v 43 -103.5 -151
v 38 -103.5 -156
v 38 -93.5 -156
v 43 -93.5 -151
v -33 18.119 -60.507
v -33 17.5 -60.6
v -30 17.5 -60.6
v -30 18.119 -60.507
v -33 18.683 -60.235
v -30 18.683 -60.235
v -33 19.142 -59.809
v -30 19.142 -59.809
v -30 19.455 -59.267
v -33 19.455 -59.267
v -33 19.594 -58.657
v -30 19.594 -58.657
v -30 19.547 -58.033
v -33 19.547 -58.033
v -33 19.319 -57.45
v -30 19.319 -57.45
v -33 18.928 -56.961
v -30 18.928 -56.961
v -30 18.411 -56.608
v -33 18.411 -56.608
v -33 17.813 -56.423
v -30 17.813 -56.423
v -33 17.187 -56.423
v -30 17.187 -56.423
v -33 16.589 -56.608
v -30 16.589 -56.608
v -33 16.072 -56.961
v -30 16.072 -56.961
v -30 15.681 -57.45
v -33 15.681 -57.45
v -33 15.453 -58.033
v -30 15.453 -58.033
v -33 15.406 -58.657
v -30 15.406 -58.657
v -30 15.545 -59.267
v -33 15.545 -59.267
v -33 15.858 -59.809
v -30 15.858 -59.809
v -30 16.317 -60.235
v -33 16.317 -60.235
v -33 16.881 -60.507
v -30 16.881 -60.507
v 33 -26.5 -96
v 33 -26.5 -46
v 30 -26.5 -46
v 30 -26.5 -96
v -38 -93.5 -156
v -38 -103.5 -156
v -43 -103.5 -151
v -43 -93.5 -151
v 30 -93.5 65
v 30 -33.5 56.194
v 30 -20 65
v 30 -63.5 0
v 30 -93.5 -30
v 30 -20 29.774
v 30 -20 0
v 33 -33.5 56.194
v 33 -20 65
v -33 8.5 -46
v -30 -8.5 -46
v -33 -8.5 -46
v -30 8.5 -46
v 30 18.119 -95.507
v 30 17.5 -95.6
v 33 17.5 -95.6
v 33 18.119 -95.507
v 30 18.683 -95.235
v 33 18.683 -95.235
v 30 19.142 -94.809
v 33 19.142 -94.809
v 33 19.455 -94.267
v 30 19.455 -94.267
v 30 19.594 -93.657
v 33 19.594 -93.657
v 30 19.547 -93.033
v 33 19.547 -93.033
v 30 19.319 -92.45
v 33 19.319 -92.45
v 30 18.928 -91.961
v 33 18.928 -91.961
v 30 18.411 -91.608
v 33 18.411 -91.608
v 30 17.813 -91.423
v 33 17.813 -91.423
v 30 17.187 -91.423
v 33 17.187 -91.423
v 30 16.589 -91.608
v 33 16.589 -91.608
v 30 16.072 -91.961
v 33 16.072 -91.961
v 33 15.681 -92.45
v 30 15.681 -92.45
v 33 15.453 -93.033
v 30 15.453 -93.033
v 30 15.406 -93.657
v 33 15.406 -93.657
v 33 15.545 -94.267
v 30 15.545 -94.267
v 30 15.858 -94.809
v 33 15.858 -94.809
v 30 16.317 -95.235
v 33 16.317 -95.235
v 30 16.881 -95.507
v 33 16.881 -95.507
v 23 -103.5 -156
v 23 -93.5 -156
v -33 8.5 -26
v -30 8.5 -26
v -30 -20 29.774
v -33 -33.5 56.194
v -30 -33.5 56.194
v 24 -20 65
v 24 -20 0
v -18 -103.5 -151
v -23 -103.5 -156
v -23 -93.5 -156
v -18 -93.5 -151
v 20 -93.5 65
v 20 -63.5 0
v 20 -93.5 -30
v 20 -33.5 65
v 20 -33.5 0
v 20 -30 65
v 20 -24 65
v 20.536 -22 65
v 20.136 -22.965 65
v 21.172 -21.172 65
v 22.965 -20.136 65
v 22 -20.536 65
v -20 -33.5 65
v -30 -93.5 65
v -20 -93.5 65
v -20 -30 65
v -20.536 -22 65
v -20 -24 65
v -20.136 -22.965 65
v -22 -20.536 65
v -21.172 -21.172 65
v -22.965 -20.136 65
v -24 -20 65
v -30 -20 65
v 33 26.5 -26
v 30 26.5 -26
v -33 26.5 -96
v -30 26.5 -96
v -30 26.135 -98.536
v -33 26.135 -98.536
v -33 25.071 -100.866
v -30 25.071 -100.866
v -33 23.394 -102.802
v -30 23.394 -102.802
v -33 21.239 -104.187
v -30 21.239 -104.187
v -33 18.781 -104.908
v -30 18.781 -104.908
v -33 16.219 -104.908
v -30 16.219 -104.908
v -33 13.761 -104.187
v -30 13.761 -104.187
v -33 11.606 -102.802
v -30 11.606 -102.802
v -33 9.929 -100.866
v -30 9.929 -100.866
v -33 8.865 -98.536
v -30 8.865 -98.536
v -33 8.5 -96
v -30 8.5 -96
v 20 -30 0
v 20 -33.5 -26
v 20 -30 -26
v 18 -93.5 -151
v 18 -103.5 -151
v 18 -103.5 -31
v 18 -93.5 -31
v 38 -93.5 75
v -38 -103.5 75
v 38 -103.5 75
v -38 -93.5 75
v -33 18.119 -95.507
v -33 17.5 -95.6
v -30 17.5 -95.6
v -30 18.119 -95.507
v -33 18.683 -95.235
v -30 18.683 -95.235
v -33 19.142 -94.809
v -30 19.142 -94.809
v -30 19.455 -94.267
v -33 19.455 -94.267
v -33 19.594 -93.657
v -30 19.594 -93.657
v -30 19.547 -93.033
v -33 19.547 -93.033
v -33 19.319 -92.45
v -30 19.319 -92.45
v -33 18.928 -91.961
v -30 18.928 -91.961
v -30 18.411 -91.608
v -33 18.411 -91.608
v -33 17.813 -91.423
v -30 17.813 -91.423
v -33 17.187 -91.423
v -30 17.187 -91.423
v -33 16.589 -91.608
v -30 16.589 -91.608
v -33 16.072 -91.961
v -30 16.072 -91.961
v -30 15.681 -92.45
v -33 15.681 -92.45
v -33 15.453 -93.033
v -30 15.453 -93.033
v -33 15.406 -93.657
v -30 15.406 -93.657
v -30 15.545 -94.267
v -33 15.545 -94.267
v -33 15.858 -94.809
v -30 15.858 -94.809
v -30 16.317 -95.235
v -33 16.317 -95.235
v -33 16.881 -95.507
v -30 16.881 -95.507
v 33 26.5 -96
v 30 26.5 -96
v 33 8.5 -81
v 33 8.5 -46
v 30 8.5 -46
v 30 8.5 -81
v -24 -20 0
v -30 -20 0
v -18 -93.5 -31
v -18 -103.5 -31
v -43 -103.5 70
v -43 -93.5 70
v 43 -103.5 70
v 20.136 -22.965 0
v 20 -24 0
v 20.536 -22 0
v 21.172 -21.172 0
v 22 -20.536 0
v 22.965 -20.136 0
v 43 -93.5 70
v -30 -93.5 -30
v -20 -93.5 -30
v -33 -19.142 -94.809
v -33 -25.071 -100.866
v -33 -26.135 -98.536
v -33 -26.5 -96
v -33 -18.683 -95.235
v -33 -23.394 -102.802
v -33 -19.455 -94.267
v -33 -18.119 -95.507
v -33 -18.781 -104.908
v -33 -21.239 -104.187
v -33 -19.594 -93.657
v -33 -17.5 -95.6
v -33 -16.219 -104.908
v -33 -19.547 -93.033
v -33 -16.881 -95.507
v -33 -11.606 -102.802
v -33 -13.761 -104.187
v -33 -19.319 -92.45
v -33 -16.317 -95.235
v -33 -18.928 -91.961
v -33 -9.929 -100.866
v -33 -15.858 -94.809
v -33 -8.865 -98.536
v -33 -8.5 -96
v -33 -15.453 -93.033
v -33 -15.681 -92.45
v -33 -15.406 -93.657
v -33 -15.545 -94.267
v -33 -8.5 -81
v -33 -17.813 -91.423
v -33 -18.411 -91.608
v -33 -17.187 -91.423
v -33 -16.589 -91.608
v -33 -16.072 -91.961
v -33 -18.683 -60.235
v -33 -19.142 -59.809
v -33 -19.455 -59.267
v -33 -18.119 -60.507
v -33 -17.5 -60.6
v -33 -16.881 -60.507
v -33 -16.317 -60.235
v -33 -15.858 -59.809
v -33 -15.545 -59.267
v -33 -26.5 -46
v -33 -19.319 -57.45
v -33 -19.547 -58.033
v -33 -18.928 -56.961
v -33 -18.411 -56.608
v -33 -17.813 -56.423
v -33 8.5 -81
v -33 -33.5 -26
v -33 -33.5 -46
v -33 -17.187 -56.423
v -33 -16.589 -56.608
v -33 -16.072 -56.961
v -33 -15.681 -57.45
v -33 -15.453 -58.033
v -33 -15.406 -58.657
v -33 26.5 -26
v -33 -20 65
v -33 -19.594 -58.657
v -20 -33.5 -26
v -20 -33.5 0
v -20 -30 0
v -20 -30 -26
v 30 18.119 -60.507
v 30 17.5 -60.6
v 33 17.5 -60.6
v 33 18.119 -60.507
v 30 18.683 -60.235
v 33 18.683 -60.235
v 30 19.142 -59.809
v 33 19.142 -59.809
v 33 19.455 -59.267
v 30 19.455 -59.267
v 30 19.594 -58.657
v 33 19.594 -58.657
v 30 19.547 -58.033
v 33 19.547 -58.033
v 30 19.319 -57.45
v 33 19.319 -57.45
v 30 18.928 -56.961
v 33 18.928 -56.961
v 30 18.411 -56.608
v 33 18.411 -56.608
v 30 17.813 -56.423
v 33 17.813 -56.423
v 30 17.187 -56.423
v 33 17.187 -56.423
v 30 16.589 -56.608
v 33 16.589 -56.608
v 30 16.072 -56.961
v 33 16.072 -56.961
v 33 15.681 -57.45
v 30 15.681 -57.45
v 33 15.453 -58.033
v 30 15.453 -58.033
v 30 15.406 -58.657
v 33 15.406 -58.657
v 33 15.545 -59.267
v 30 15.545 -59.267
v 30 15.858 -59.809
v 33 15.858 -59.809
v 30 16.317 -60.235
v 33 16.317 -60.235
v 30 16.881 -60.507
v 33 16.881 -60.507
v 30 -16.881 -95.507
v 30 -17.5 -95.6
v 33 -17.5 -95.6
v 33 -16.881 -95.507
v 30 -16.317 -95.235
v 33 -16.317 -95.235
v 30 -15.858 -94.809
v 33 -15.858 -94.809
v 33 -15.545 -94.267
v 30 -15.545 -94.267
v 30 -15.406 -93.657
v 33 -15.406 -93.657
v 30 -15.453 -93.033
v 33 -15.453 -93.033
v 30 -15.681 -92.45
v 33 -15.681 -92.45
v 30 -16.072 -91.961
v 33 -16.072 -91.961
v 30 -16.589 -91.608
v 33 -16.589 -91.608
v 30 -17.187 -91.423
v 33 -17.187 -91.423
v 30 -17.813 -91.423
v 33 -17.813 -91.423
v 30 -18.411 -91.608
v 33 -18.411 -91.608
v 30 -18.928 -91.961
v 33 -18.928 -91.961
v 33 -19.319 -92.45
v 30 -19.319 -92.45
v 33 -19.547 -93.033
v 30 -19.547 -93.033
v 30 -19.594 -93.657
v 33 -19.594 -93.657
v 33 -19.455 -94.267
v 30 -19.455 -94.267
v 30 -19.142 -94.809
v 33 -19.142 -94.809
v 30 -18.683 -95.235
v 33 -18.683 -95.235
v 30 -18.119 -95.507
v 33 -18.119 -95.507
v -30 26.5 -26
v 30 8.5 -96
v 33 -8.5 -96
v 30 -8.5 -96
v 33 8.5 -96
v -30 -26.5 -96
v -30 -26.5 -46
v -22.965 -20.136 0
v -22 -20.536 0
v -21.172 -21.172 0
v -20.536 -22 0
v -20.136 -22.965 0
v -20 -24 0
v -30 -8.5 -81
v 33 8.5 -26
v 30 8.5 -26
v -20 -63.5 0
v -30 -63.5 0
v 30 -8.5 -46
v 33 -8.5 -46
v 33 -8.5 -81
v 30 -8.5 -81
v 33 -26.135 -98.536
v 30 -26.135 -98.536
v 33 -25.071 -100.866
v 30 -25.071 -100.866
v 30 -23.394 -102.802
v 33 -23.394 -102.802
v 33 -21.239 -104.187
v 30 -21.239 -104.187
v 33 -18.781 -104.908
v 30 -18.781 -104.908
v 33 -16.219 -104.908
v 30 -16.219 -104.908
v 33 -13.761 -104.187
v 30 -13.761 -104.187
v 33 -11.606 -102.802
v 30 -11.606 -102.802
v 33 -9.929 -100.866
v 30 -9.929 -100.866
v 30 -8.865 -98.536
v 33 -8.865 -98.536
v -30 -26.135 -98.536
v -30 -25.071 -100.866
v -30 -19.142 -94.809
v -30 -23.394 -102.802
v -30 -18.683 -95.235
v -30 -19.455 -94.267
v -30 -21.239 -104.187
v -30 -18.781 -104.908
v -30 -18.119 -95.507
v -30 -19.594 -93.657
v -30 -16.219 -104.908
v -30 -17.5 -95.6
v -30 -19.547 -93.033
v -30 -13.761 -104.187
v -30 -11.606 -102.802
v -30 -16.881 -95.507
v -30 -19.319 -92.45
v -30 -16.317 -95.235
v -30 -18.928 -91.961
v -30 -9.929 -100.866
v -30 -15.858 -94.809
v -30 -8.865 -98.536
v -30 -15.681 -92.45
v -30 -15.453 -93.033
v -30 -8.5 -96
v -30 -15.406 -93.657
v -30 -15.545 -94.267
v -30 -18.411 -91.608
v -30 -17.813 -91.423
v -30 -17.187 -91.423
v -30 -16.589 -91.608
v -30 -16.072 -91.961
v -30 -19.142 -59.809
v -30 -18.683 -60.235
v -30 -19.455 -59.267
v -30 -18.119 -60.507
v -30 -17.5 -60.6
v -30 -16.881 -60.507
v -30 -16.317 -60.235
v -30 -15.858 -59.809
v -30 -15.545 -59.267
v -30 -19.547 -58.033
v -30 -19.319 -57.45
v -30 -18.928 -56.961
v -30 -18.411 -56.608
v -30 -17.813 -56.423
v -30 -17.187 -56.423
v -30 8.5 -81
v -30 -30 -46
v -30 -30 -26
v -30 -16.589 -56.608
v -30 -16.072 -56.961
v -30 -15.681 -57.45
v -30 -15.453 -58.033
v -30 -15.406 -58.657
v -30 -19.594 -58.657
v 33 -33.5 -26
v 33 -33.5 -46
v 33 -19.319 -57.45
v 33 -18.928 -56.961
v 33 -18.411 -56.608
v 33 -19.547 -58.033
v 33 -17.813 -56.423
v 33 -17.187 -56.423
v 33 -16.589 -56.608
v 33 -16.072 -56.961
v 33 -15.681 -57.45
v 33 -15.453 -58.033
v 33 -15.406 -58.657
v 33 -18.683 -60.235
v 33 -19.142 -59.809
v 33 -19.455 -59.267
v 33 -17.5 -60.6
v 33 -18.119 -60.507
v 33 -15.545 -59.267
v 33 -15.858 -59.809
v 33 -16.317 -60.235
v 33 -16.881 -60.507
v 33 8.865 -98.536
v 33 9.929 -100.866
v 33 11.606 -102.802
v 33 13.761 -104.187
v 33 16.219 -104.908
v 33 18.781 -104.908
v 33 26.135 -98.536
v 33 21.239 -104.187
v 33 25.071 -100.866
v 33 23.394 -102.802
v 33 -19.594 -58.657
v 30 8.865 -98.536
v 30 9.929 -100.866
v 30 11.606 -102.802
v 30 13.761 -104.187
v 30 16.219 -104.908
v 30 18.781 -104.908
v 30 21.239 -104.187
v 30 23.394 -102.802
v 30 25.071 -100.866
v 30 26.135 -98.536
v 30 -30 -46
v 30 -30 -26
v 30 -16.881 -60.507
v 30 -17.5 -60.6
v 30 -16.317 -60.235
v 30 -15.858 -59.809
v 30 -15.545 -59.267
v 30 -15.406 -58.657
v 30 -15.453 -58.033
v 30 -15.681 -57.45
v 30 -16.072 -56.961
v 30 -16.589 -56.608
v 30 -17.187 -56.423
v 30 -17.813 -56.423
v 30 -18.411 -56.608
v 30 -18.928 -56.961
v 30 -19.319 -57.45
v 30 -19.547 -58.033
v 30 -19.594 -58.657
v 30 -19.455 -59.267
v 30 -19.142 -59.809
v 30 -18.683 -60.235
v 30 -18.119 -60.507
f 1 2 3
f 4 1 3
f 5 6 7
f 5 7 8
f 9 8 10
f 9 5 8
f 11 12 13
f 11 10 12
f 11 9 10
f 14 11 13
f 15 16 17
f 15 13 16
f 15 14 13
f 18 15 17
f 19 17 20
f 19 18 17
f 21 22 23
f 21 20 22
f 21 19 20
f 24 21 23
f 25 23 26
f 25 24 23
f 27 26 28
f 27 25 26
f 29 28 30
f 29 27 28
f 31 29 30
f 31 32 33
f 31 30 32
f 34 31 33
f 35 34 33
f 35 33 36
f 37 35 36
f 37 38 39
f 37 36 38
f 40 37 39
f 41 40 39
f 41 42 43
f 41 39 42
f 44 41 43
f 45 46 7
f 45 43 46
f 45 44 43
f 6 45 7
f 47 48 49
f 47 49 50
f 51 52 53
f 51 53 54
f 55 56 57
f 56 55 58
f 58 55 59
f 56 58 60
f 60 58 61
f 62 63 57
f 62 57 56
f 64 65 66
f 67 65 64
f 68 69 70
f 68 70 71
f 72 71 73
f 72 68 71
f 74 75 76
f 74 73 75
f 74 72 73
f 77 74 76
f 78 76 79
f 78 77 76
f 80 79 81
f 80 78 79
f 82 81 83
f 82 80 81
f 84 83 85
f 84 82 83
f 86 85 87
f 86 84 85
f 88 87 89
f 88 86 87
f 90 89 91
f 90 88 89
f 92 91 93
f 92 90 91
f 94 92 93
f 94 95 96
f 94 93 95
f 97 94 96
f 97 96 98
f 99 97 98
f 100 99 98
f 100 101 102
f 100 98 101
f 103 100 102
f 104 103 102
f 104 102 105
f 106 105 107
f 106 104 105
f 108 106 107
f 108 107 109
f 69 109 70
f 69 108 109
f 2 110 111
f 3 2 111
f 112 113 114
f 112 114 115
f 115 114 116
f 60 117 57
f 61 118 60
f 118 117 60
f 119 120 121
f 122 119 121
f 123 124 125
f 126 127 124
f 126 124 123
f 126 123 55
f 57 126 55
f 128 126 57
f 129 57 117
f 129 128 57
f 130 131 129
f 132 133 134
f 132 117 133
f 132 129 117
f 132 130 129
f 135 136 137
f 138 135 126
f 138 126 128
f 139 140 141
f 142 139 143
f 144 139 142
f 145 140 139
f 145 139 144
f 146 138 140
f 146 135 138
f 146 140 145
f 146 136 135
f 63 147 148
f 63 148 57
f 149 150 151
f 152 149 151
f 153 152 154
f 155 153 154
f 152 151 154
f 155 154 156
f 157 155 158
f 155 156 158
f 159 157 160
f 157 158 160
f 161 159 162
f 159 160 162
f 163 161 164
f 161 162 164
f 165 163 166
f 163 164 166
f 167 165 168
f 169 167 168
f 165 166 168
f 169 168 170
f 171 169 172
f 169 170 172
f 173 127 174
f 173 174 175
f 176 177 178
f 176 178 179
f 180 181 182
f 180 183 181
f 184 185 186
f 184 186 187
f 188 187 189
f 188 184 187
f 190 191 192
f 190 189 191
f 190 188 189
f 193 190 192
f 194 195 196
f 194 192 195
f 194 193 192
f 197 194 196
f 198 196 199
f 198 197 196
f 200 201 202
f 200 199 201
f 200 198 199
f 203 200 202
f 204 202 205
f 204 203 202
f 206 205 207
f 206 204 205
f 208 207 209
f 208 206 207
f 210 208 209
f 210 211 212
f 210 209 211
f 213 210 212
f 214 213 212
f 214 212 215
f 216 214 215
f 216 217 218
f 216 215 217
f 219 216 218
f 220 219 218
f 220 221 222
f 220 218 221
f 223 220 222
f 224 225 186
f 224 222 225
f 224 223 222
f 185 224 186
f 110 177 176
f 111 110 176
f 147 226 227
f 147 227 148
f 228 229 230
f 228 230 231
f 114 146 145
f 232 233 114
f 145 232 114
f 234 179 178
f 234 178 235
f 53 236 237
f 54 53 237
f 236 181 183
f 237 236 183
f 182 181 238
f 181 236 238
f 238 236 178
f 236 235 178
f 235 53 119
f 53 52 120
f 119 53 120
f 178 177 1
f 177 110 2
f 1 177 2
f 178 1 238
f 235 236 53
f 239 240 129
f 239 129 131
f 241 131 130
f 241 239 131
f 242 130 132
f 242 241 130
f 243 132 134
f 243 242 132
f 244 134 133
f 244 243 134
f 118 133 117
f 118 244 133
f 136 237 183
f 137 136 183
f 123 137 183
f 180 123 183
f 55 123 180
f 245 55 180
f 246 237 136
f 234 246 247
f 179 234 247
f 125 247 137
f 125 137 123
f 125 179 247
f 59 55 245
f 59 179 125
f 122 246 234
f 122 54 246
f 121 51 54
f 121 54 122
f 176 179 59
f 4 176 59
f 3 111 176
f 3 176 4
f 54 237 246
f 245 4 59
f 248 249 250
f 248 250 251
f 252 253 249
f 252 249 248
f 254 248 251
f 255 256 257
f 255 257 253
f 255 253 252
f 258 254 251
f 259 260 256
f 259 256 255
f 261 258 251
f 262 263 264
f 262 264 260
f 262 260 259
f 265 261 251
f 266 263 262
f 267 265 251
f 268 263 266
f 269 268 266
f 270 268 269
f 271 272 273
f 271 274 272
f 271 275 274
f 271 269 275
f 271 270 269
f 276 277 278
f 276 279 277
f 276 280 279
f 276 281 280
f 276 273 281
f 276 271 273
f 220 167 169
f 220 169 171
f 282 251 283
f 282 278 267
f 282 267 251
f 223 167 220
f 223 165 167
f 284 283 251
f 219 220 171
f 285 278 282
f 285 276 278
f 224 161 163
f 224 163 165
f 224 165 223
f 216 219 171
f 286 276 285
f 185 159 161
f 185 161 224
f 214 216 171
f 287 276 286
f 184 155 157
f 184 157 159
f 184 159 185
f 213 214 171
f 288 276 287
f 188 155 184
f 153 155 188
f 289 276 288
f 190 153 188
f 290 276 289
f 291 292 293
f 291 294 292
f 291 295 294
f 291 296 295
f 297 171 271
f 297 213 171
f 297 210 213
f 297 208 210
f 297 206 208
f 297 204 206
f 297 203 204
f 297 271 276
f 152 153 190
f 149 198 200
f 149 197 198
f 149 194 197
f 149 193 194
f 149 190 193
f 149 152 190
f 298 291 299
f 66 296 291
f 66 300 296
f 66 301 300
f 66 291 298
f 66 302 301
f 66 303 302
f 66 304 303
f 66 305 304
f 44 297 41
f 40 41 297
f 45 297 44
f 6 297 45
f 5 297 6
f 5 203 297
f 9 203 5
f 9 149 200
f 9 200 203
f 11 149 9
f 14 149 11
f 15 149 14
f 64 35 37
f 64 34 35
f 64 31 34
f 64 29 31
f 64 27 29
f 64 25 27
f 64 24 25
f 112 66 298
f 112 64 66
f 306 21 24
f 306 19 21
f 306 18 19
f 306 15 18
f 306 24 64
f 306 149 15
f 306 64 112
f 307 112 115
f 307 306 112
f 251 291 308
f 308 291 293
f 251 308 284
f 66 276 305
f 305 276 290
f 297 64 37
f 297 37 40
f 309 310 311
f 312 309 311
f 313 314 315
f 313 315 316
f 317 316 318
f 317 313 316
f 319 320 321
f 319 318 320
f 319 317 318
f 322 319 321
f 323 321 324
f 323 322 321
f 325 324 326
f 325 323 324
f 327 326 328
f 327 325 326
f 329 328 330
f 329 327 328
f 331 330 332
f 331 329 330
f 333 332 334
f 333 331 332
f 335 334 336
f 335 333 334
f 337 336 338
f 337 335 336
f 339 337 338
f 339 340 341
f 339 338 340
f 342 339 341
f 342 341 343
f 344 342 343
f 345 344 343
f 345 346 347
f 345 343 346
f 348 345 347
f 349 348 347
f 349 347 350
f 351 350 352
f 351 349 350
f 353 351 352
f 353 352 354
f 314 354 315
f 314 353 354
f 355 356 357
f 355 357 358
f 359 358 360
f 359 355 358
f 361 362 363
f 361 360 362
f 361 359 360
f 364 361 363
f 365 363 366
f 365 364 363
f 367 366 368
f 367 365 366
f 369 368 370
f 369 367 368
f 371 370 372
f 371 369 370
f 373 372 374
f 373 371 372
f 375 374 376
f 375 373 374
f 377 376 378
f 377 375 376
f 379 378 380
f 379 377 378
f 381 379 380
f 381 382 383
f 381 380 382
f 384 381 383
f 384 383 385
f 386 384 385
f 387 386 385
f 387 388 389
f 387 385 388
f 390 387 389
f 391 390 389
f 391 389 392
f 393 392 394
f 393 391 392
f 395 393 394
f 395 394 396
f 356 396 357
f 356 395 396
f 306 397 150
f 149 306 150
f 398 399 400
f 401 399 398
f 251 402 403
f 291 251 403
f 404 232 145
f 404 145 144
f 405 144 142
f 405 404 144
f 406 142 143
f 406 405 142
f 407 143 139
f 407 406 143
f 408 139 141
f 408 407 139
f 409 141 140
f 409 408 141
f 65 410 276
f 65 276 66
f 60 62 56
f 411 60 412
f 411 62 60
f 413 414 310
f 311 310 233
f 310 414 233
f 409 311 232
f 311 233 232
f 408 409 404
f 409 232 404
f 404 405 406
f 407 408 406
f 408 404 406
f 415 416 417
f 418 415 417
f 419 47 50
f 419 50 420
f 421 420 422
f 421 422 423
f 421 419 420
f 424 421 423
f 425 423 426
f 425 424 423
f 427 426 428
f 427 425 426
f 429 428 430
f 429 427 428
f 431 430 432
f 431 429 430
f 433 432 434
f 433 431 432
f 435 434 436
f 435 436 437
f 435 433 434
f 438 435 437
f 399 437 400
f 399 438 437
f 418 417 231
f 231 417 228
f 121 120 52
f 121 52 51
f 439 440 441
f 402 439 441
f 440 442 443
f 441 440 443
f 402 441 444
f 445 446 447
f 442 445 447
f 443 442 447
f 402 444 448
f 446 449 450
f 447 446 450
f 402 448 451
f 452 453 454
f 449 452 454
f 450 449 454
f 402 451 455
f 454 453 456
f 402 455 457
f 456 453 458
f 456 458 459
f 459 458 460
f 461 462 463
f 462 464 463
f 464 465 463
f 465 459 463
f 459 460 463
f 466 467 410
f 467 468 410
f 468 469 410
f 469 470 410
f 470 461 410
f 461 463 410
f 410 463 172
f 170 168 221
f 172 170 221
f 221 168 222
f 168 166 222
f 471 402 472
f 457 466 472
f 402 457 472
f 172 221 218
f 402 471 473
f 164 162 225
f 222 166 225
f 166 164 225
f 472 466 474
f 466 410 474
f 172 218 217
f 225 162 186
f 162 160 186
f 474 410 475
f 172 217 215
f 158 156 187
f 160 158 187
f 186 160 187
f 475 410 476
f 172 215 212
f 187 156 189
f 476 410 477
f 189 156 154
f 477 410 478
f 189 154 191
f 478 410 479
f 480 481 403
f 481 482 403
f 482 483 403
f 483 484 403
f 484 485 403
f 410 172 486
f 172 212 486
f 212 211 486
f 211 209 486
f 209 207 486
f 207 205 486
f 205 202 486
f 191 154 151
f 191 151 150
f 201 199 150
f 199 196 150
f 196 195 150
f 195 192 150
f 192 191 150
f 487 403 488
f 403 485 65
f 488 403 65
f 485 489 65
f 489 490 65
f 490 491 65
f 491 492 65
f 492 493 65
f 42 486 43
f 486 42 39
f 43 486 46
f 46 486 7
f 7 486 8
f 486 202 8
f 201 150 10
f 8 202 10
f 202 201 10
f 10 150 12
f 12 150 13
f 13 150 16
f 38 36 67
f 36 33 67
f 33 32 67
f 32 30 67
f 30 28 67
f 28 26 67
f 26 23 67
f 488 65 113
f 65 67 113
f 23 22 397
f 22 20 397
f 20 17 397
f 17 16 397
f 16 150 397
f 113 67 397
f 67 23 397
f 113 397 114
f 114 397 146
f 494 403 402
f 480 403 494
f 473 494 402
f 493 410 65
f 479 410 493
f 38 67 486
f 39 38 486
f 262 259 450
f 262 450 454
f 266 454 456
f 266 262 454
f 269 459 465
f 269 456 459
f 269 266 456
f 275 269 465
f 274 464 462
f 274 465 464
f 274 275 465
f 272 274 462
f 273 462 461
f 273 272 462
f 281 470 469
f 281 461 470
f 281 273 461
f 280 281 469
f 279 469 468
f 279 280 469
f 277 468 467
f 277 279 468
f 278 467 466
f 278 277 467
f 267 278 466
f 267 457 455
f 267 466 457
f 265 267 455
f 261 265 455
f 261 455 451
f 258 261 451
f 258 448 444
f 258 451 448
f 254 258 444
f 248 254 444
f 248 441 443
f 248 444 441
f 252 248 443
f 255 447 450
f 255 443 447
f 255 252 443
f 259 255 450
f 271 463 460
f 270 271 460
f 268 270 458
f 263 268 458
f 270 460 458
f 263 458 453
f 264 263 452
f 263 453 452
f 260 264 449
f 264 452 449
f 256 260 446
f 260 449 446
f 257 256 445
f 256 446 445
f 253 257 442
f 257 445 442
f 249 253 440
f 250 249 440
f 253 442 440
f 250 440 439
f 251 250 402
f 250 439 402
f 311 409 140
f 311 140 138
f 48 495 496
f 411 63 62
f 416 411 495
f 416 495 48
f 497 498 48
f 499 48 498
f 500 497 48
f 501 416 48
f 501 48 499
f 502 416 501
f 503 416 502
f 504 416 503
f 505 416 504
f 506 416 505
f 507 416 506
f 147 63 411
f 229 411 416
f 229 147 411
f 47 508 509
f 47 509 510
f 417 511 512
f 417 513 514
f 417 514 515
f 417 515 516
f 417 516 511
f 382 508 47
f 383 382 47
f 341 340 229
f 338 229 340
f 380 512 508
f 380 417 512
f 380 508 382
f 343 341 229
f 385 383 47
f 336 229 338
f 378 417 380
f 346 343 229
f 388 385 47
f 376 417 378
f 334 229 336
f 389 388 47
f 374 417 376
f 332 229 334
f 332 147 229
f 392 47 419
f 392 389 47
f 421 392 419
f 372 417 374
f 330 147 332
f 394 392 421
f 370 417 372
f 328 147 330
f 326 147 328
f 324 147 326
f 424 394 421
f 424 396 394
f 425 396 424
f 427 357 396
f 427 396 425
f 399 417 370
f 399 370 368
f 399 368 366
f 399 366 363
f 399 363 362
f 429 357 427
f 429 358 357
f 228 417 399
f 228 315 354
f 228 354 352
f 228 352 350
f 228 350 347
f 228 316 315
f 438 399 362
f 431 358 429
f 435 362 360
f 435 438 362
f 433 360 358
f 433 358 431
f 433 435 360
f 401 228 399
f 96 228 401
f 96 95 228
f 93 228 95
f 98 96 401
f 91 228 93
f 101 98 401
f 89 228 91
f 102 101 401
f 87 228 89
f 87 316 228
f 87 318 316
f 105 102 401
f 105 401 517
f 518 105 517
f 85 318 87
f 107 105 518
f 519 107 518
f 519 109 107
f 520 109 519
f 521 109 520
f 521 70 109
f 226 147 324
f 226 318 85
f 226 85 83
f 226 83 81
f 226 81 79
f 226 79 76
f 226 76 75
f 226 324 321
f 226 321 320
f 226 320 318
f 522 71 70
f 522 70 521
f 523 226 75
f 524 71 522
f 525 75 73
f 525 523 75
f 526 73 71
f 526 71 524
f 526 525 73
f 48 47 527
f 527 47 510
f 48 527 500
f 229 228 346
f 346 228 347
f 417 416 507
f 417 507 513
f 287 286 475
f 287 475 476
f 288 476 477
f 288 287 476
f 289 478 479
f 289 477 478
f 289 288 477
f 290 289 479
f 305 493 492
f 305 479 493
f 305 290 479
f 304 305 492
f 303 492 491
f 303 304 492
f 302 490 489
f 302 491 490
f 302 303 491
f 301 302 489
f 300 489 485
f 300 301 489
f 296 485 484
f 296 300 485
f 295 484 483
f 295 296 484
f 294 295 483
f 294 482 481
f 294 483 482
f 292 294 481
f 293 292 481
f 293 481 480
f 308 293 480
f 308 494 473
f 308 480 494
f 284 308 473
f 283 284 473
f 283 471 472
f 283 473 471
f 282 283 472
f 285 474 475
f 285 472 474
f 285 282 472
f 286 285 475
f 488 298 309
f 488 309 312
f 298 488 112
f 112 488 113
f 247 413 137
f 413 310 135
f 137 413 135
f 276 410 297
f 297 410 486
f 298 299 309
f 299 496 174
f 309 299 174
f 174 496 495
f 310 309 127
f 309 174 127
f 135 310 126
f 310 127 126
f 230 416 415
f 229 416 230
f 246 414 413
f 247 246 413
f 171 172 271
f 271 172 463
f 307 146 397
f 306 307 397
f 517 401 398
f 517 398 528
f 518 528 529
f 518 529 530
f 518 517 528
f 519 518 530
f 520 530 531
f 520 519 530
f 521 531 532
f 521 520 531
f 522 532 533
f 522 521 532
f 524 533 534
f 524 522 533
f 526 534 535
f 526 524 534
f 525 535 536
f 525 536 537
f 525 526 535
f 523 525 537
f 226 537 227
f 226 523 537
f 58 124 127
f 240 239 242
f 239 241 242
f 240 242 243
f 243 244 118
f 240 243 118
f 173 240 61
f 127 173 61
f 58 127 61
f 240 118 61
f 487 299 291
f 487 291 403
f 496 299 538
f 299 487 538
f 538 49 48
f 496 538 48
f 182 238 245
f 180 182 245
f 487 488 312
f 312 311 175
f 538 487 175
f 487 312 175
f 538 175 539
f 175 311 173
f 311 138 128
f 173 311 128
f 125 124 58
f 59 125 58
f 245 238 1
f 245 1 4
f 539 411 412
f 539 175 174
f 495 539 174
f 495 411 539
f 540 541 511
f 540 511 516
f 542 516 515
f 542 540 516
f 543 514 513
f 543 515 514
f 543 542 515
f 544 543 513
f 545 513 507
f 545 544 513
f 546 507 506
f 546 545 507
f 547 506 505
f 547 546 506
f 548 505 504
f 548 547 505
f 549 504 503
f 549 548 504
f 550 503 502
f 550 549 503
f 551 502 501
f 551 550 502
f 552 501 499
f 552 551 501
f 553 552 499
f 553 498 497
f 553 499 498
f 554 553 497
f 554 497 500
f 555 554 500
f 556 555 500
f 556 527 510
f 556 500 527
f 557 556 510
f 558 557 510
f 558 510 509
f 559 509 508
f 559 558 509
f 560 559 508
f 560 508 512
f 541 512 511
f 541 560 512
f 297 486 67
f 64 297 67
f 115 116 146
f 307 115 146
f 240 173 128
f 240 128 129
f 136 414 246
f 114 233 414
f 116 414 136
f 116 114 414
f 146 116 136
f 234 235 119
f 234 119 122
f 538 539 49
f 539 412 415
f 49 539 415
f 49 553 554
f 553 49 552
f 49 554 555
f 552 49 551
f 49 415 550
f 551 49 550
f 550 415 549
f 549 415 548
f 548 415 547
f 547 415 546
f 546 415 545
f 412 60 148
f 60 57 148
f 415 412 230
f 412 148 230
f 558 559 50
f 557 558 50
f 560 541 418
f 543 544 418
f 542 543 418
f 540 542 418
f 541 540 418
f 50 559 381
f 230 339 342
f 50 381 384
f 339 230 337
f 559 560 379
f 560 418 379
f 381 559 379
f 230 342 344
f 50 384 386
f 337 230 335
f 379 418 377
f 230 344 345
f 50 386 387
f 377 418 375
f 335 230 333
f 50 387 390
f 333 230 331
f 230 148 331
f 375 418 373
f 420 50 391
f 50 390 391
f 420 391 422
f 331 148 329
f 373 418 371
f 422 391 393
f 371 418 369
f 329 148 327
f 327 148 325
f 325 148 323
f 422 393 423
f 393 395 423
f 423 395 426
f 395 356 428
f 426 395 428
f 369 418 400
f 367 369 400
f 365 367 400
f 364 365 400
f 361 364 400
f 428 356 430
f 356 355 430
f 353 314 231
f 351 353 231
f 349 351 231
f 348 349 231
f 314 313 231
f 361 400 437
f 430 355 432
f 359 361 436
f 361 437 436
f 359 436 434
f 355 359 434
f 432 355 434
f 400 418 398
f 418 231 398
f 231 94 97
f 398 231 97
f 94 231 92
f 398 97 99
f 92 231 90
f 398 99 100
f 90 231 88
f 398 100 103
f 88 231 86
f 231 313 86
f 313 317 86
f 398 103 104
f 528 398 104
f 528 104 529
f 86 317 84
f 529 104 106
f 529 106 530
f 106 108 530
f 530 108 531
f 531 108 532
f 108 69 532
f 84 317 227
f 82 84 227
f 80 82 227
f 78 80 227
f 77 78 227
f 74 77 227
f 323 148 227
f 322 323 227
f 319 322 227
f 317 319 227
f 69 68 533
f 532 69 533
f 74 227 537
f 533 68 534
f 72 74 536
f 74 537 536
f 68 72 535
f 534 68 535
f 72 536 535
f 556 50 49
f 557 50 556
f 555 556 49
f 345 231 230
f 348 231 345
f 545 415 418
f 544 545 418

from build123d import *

# Parameters (mm, degrees)
SKETCH_1_W               = 60
SKETCH_1_H               = 3
EXTRUDE_1_DEPTH          = 65
SKETCH_2_W               = 40
SKETCH_2_H               = 3.5
EXTRUDE_2_DEPTH          = 46
EXTRUDE_3_DEPTH          = 3.5
SKETCH_5_W               = 35
SKETCH_5_H               = 17
EXTRUDE_4_DEPTH          = 3
EXTRUDE_START            = 3
SKETCH_6_W               = 35
SKETCH_6_H               = 17
SKETCH_6_W_2             = 20
SKETCH_6_H_2             = 3.5
EXTRUDE_5_DEPTH          = 3
SKETCH_7_W               = 36
SKETCH_7_H               = 10
SKETCH_7_W_2             = 10
SKETCH_7_H_2             = 65
EXTRUDE_6_DEPTH          = 60
SKETCH_8_W               = 66
SKETCH_8_H               = 111
EXTRUDE_7_DEPTH          = 10
SKETCH_9_W               = 15
SKETCH_9_H               = 10
EXTRUDE_8_DEPTH          = 110
SKETCH_10_W              = 36
SKETCH_10_H              = 70
CUT_EXTRUDE_2_DEPTH      = 15
SKETCH_13_W              = 221
SKETCH_13_H              = 10
EXTRUDE_9_DEPTH          = 10
SKETCH_14_W              = 221
SKETCH_14_H              = 10
EXTRUDE_10_DEPTH         = 10
SKETCH_15_W              = 86
SKETCH_15_H              = 10
EXTRUDE_11_DEPTH         = 10
CHAMFER_1_SIZE           = 30
CHAMFER_2_SIZE           = 30
CUT_EXTRUDE_3_DEPTH      = 15
CUT_EXTRUDE_3_DEPTH_BACK = 75
SKETCH_16_R              = 2.1
CHAMFER_3_SIZE           = 5


with BuildPart() as part:
    # 草图1 → 凸台-拉伸1 (new body)
    with BuildSketch(Plane.XY):
        with Locations((0, -32)):
            Rectangle(SKETCH_1_W, SKETCH_1_H)
        with BuildLine():
            Line((-20, -24), (-20, -28))
            Line((-20, -28), (-20, -30))
            Line((-20, -30), (20, -30))
            Line((20, -30), (20, -28))
            Line((20, -28), (20, -24))
            ThreePointArc((20, -24), (21.171572875, -21.171572875), (24, -20))
            Line((24, -20), (28, -20))
            Line((28, -20), (30, -20))
            Line((30, -20), (30, -30.5))
            Line((30, -30.5), (-30, -30.5))
            Line((-30, -30.5), (-30, -20))
            Line((-30, -20), (-28, -20))
            Line((-28, -20), (-24, -20))
            ThreePointArc((-24, -20), (-21.171572875, -21.171572875), (-20, -24))
        make_face()
    extrude(amount=EXTRUDE_1_DEPTH)

    # 草图2 → 凸台-拉伸2 (add)
    with BuildSketch(Plane(origin=(0, 0, 0), x_dir=(-1, 0, 0), z_dir=(0, 0, -1))):
        with Locations((0, -31.75)):
            Rectangle(SKETCH_2_W, SKETCH_2_H)
    extrude(amount=EXTRUDE_2_DEPTH)

    # 草图4 → 凸台-拉伸3 (add)
    with BuildSketch(Plane.XZ.offset(33.5)):
        Polygon((20, -46), (30, -46), (30, -26), (20, -26), (-30, -26), (-30, -46), align=None)
    extrude(amount=-EXTRUDE_3_DEPTH)

    # 草图5 → 凸台-拉伸4 (add)
    with BuildSketch(Plane.ZY.offset(30)):
        with BuildLine():
            Line((-46, -26.5), (-46, -33.5))
            Line((-46, -33.5), (-26, -33.5))
            Line((-26, -33.5), (-26, 8.5))
            Line((-26, 8.5), (56.193548387, -33.5))
            Line((56.193548387, -33.5), (65, -20))
            Line((65, -20), (-26, 26.5))
            Line((-26, 26.5), (-96, 26.5))
            ThreePointArc((-96, 26.5), (-105, 17.5), (-96, 8.5))
            Line((-96, 8.5), (-96, -8.5))
            ThreePointArc((-96, -8.5), (-105, -17.5), (-96, -26.5))
            Line((-96, -26.5), (-46, -26.5))
        make_face()
        with Locations((-63.5, 0)):
            Rectangle(SKETCH_5_W, SKETCH_5_H, mode=Mode.SUBTRACT)
    extrude(amount=EXTRUDE_4_DEPTH)

    # 草图6 → 凸台-拉伸5 (add)
    # profile 1 of 3: a face of its own
    with BuildSketch(Plane(origin=(30, 0, 0), x_dir=(0, 0, -1), z_dir=(1, 0, 0)).offset(EXTRUDE_START)):
        Polygon((26, 8.5), (26, 26.5), (-65, -20), (-56.193548387, -33.5), align=None)
    # profile 2 of 3: a face of its own
    with BuildSketch(Plane(origin=(30, 0, 0), x_dir=(0, 0, -1), z_dir=(1, 0, 0)).offset(EXTRUDE_START)):
        with BuildLine():
            Line((96, 26.5), (46, 26.5))
            Line((46, 26.5), (26, 26.5))
            Line((26, 26.5), (26, 8.5))
            Line((26, 8.5), (26, -30))
            Line((26, -30), (46, -30))
            Line((46, -30), (46, -26.5))
            Line((46, -26.5), (96, -26.5))
            ThreePointArc((96, -26.5), (105, -17.5), (96, -8.5))
            Line((96, -8.5), (96, 8.5))
            ThreePointArc((96, 8.5), (105, 17.5), (96, 26.5))
        make_face()
        with Locations((63.5, 0)):
            Rectangle(SKETCH_6_W, SKETCH_6_H, mode=Mode.SUBTRACT)
    # profile 3 of 3: a face of its own
    with BuildSketch(Plane(origin=(30, 0, 0), x_dir=(0, 0, -1), z_dir=(1, 0, 0)).offset(EXTRUDE_START)):
        with Locations((36, -31.75)):
            Rectangle(SKETCH_6_W_2, SKETCH_6_H_2)
    extrude(amount=-EXTRUDE_5_DEPTH)

    # 草图7 → 凸台-拉伸6 (add)
    with BuildSketch(Plane.XZ.offset(33.5)):
        with Locations((0, -41)):
            Rectangle(SKETCH_7_W, SKETCH_7_H)
        with Locations((-25, 32.5)):
            Rectangle(SKETCH_7_W_2, SKETCH_7_H_2)
        with Locations((25, 32.5)):
            Rectangle(SKETCH_7_W_2, SKETCH_7_H_2)
    extrude(amount=EXTRUDE_6_DEPTH)

    # 草图8 → 凸台-拉伸7 (add)
    with BuildSketch(Plane.XZ.offset(93.5)):
        with Locations((0, 9.5)):
            Rectangle(SKETCH_8_W, SKETCH_8_H)
    extrude(amount=EXTRUDE_7_DEPTH)

    # 草图9 → 凸台-拉伸8 (add)
    with BuildSketch(Plane(origin=(0, 0, -46), x_dir=(-1, 0, 0), z_dir=(0, 0, -1))):
        with Locations((25.5, -98.5)):
            Rectangle(SKETCH_9_W, SKETCH_9_H)
        with Locations((-25.5, -98.5)):
            Rectangle(SKETCH_9_W, SKETCH_9_H)
    extrude(amount=EXTRUDE_8_DEPTH)

    # 草图10 → 切除-拉伸2 (cut)
    with BuildSketch(Plane(origin=(0, 0, -46), x_dir=(-1, 0, 0), z_dir=(0, 0, -1))):
        with Locations((0, -68.5)):
            Rectangle(SKETCH_10_W, SKETCH_10_H)
    extrude(amount=-CUT_EXTRUDE_2_DEPTH, mode=Mode.SUBTRACT)

    # 草图13 → 凸台-拉伸9 (add)
    with BuildSketch(Plane.ZY.offset(33)):
        with Locations((-45.5, -98.5)):
            Rectangle(SKETCH_13_W, SKETCH_13_H)
    extrude(amount=EXTRUDE_9_DEPTH)

    # 草图14 → 凸台-拉伸10 (add)
    with BuildSketch(Plane(origin=(33, 0, 0), x_dir=(0, 0, -1), z_dir=(1, 0, 0))):
        with Locations((45.5, -98.5)):
            Rectangle(SKETCH_14_W, SKETCH_14_H)
    extrude(amount=EXTRUDE_10_DEPTH)

    # 草图15 → 凸台-拉伸11 (add)
    with BuildSketch(Plane.XY.offset(65)):
        with Locations((0, -98.5)):
            Rectangle(SKETCH_15_W, SKETCH_15_H)
    extrude(amount=EXTRUDE_11_DEPTH)

    # 倒角1
    chamfer_1_edges = [part.edges().sort_by_distance(p)[0] for p in [
        (25, -93.5, 0),
    ]]
    chamfer(chamfer_1_edges, length=CHAMFER_1_SIZE)

    # 倒角2
    chamfer_2_edges = [part.edges().sort_by_distance(p)[0] for p in [
        (-25, -93.5, 0),
    ]]
    chamfer(chamfer_2_edges, length=CHAMFER_2_SIZE)

    # 草图16 → 切除-拉伸3 (cut, two sides: drawn at the far end of the back side and taken through both)
    with BuildSketch(Plane(origin=(33, 0, 0), x_dir=(0, 0, -1), z_dir=(1, 0, 0)).offset(-CUT_EXTRUDE_3_DEPTH_BACK)):
        with Locations((93.5, 17.5)):
            Circle(SKETCH_16_R)
        with Locations((58.5, 17.5)):
            Circle(SKETCH_16_R)
        with Locations((58.5, -17.5)):
            Circle(SKETCH_16_R)
        with Locations((93.5, -17.5)):
            Circle(SKETCH_16_R)
    extrude(amount=CUT_EXTRUDE_3_DEPTH + CUT_EXTRUDE_3_DEPTH_BACK, mode=Mode.SUBTRACT)

    # 倒角3
    chamfer_3_edges = [part.edges().sort_by_distance(p)[0] for p in [
        (-18, -98.5, -156),
        (18, -98.5, -156),
        (-43, -98.5, -156),
        (43, -98.5, -156),
        (-43, -98.5, 75),
        (43, -98.5, 75),
    ]]
    chamfer(chamfer_3_edges, length=CHAMFER_3_SIZE)


solid = part.part
